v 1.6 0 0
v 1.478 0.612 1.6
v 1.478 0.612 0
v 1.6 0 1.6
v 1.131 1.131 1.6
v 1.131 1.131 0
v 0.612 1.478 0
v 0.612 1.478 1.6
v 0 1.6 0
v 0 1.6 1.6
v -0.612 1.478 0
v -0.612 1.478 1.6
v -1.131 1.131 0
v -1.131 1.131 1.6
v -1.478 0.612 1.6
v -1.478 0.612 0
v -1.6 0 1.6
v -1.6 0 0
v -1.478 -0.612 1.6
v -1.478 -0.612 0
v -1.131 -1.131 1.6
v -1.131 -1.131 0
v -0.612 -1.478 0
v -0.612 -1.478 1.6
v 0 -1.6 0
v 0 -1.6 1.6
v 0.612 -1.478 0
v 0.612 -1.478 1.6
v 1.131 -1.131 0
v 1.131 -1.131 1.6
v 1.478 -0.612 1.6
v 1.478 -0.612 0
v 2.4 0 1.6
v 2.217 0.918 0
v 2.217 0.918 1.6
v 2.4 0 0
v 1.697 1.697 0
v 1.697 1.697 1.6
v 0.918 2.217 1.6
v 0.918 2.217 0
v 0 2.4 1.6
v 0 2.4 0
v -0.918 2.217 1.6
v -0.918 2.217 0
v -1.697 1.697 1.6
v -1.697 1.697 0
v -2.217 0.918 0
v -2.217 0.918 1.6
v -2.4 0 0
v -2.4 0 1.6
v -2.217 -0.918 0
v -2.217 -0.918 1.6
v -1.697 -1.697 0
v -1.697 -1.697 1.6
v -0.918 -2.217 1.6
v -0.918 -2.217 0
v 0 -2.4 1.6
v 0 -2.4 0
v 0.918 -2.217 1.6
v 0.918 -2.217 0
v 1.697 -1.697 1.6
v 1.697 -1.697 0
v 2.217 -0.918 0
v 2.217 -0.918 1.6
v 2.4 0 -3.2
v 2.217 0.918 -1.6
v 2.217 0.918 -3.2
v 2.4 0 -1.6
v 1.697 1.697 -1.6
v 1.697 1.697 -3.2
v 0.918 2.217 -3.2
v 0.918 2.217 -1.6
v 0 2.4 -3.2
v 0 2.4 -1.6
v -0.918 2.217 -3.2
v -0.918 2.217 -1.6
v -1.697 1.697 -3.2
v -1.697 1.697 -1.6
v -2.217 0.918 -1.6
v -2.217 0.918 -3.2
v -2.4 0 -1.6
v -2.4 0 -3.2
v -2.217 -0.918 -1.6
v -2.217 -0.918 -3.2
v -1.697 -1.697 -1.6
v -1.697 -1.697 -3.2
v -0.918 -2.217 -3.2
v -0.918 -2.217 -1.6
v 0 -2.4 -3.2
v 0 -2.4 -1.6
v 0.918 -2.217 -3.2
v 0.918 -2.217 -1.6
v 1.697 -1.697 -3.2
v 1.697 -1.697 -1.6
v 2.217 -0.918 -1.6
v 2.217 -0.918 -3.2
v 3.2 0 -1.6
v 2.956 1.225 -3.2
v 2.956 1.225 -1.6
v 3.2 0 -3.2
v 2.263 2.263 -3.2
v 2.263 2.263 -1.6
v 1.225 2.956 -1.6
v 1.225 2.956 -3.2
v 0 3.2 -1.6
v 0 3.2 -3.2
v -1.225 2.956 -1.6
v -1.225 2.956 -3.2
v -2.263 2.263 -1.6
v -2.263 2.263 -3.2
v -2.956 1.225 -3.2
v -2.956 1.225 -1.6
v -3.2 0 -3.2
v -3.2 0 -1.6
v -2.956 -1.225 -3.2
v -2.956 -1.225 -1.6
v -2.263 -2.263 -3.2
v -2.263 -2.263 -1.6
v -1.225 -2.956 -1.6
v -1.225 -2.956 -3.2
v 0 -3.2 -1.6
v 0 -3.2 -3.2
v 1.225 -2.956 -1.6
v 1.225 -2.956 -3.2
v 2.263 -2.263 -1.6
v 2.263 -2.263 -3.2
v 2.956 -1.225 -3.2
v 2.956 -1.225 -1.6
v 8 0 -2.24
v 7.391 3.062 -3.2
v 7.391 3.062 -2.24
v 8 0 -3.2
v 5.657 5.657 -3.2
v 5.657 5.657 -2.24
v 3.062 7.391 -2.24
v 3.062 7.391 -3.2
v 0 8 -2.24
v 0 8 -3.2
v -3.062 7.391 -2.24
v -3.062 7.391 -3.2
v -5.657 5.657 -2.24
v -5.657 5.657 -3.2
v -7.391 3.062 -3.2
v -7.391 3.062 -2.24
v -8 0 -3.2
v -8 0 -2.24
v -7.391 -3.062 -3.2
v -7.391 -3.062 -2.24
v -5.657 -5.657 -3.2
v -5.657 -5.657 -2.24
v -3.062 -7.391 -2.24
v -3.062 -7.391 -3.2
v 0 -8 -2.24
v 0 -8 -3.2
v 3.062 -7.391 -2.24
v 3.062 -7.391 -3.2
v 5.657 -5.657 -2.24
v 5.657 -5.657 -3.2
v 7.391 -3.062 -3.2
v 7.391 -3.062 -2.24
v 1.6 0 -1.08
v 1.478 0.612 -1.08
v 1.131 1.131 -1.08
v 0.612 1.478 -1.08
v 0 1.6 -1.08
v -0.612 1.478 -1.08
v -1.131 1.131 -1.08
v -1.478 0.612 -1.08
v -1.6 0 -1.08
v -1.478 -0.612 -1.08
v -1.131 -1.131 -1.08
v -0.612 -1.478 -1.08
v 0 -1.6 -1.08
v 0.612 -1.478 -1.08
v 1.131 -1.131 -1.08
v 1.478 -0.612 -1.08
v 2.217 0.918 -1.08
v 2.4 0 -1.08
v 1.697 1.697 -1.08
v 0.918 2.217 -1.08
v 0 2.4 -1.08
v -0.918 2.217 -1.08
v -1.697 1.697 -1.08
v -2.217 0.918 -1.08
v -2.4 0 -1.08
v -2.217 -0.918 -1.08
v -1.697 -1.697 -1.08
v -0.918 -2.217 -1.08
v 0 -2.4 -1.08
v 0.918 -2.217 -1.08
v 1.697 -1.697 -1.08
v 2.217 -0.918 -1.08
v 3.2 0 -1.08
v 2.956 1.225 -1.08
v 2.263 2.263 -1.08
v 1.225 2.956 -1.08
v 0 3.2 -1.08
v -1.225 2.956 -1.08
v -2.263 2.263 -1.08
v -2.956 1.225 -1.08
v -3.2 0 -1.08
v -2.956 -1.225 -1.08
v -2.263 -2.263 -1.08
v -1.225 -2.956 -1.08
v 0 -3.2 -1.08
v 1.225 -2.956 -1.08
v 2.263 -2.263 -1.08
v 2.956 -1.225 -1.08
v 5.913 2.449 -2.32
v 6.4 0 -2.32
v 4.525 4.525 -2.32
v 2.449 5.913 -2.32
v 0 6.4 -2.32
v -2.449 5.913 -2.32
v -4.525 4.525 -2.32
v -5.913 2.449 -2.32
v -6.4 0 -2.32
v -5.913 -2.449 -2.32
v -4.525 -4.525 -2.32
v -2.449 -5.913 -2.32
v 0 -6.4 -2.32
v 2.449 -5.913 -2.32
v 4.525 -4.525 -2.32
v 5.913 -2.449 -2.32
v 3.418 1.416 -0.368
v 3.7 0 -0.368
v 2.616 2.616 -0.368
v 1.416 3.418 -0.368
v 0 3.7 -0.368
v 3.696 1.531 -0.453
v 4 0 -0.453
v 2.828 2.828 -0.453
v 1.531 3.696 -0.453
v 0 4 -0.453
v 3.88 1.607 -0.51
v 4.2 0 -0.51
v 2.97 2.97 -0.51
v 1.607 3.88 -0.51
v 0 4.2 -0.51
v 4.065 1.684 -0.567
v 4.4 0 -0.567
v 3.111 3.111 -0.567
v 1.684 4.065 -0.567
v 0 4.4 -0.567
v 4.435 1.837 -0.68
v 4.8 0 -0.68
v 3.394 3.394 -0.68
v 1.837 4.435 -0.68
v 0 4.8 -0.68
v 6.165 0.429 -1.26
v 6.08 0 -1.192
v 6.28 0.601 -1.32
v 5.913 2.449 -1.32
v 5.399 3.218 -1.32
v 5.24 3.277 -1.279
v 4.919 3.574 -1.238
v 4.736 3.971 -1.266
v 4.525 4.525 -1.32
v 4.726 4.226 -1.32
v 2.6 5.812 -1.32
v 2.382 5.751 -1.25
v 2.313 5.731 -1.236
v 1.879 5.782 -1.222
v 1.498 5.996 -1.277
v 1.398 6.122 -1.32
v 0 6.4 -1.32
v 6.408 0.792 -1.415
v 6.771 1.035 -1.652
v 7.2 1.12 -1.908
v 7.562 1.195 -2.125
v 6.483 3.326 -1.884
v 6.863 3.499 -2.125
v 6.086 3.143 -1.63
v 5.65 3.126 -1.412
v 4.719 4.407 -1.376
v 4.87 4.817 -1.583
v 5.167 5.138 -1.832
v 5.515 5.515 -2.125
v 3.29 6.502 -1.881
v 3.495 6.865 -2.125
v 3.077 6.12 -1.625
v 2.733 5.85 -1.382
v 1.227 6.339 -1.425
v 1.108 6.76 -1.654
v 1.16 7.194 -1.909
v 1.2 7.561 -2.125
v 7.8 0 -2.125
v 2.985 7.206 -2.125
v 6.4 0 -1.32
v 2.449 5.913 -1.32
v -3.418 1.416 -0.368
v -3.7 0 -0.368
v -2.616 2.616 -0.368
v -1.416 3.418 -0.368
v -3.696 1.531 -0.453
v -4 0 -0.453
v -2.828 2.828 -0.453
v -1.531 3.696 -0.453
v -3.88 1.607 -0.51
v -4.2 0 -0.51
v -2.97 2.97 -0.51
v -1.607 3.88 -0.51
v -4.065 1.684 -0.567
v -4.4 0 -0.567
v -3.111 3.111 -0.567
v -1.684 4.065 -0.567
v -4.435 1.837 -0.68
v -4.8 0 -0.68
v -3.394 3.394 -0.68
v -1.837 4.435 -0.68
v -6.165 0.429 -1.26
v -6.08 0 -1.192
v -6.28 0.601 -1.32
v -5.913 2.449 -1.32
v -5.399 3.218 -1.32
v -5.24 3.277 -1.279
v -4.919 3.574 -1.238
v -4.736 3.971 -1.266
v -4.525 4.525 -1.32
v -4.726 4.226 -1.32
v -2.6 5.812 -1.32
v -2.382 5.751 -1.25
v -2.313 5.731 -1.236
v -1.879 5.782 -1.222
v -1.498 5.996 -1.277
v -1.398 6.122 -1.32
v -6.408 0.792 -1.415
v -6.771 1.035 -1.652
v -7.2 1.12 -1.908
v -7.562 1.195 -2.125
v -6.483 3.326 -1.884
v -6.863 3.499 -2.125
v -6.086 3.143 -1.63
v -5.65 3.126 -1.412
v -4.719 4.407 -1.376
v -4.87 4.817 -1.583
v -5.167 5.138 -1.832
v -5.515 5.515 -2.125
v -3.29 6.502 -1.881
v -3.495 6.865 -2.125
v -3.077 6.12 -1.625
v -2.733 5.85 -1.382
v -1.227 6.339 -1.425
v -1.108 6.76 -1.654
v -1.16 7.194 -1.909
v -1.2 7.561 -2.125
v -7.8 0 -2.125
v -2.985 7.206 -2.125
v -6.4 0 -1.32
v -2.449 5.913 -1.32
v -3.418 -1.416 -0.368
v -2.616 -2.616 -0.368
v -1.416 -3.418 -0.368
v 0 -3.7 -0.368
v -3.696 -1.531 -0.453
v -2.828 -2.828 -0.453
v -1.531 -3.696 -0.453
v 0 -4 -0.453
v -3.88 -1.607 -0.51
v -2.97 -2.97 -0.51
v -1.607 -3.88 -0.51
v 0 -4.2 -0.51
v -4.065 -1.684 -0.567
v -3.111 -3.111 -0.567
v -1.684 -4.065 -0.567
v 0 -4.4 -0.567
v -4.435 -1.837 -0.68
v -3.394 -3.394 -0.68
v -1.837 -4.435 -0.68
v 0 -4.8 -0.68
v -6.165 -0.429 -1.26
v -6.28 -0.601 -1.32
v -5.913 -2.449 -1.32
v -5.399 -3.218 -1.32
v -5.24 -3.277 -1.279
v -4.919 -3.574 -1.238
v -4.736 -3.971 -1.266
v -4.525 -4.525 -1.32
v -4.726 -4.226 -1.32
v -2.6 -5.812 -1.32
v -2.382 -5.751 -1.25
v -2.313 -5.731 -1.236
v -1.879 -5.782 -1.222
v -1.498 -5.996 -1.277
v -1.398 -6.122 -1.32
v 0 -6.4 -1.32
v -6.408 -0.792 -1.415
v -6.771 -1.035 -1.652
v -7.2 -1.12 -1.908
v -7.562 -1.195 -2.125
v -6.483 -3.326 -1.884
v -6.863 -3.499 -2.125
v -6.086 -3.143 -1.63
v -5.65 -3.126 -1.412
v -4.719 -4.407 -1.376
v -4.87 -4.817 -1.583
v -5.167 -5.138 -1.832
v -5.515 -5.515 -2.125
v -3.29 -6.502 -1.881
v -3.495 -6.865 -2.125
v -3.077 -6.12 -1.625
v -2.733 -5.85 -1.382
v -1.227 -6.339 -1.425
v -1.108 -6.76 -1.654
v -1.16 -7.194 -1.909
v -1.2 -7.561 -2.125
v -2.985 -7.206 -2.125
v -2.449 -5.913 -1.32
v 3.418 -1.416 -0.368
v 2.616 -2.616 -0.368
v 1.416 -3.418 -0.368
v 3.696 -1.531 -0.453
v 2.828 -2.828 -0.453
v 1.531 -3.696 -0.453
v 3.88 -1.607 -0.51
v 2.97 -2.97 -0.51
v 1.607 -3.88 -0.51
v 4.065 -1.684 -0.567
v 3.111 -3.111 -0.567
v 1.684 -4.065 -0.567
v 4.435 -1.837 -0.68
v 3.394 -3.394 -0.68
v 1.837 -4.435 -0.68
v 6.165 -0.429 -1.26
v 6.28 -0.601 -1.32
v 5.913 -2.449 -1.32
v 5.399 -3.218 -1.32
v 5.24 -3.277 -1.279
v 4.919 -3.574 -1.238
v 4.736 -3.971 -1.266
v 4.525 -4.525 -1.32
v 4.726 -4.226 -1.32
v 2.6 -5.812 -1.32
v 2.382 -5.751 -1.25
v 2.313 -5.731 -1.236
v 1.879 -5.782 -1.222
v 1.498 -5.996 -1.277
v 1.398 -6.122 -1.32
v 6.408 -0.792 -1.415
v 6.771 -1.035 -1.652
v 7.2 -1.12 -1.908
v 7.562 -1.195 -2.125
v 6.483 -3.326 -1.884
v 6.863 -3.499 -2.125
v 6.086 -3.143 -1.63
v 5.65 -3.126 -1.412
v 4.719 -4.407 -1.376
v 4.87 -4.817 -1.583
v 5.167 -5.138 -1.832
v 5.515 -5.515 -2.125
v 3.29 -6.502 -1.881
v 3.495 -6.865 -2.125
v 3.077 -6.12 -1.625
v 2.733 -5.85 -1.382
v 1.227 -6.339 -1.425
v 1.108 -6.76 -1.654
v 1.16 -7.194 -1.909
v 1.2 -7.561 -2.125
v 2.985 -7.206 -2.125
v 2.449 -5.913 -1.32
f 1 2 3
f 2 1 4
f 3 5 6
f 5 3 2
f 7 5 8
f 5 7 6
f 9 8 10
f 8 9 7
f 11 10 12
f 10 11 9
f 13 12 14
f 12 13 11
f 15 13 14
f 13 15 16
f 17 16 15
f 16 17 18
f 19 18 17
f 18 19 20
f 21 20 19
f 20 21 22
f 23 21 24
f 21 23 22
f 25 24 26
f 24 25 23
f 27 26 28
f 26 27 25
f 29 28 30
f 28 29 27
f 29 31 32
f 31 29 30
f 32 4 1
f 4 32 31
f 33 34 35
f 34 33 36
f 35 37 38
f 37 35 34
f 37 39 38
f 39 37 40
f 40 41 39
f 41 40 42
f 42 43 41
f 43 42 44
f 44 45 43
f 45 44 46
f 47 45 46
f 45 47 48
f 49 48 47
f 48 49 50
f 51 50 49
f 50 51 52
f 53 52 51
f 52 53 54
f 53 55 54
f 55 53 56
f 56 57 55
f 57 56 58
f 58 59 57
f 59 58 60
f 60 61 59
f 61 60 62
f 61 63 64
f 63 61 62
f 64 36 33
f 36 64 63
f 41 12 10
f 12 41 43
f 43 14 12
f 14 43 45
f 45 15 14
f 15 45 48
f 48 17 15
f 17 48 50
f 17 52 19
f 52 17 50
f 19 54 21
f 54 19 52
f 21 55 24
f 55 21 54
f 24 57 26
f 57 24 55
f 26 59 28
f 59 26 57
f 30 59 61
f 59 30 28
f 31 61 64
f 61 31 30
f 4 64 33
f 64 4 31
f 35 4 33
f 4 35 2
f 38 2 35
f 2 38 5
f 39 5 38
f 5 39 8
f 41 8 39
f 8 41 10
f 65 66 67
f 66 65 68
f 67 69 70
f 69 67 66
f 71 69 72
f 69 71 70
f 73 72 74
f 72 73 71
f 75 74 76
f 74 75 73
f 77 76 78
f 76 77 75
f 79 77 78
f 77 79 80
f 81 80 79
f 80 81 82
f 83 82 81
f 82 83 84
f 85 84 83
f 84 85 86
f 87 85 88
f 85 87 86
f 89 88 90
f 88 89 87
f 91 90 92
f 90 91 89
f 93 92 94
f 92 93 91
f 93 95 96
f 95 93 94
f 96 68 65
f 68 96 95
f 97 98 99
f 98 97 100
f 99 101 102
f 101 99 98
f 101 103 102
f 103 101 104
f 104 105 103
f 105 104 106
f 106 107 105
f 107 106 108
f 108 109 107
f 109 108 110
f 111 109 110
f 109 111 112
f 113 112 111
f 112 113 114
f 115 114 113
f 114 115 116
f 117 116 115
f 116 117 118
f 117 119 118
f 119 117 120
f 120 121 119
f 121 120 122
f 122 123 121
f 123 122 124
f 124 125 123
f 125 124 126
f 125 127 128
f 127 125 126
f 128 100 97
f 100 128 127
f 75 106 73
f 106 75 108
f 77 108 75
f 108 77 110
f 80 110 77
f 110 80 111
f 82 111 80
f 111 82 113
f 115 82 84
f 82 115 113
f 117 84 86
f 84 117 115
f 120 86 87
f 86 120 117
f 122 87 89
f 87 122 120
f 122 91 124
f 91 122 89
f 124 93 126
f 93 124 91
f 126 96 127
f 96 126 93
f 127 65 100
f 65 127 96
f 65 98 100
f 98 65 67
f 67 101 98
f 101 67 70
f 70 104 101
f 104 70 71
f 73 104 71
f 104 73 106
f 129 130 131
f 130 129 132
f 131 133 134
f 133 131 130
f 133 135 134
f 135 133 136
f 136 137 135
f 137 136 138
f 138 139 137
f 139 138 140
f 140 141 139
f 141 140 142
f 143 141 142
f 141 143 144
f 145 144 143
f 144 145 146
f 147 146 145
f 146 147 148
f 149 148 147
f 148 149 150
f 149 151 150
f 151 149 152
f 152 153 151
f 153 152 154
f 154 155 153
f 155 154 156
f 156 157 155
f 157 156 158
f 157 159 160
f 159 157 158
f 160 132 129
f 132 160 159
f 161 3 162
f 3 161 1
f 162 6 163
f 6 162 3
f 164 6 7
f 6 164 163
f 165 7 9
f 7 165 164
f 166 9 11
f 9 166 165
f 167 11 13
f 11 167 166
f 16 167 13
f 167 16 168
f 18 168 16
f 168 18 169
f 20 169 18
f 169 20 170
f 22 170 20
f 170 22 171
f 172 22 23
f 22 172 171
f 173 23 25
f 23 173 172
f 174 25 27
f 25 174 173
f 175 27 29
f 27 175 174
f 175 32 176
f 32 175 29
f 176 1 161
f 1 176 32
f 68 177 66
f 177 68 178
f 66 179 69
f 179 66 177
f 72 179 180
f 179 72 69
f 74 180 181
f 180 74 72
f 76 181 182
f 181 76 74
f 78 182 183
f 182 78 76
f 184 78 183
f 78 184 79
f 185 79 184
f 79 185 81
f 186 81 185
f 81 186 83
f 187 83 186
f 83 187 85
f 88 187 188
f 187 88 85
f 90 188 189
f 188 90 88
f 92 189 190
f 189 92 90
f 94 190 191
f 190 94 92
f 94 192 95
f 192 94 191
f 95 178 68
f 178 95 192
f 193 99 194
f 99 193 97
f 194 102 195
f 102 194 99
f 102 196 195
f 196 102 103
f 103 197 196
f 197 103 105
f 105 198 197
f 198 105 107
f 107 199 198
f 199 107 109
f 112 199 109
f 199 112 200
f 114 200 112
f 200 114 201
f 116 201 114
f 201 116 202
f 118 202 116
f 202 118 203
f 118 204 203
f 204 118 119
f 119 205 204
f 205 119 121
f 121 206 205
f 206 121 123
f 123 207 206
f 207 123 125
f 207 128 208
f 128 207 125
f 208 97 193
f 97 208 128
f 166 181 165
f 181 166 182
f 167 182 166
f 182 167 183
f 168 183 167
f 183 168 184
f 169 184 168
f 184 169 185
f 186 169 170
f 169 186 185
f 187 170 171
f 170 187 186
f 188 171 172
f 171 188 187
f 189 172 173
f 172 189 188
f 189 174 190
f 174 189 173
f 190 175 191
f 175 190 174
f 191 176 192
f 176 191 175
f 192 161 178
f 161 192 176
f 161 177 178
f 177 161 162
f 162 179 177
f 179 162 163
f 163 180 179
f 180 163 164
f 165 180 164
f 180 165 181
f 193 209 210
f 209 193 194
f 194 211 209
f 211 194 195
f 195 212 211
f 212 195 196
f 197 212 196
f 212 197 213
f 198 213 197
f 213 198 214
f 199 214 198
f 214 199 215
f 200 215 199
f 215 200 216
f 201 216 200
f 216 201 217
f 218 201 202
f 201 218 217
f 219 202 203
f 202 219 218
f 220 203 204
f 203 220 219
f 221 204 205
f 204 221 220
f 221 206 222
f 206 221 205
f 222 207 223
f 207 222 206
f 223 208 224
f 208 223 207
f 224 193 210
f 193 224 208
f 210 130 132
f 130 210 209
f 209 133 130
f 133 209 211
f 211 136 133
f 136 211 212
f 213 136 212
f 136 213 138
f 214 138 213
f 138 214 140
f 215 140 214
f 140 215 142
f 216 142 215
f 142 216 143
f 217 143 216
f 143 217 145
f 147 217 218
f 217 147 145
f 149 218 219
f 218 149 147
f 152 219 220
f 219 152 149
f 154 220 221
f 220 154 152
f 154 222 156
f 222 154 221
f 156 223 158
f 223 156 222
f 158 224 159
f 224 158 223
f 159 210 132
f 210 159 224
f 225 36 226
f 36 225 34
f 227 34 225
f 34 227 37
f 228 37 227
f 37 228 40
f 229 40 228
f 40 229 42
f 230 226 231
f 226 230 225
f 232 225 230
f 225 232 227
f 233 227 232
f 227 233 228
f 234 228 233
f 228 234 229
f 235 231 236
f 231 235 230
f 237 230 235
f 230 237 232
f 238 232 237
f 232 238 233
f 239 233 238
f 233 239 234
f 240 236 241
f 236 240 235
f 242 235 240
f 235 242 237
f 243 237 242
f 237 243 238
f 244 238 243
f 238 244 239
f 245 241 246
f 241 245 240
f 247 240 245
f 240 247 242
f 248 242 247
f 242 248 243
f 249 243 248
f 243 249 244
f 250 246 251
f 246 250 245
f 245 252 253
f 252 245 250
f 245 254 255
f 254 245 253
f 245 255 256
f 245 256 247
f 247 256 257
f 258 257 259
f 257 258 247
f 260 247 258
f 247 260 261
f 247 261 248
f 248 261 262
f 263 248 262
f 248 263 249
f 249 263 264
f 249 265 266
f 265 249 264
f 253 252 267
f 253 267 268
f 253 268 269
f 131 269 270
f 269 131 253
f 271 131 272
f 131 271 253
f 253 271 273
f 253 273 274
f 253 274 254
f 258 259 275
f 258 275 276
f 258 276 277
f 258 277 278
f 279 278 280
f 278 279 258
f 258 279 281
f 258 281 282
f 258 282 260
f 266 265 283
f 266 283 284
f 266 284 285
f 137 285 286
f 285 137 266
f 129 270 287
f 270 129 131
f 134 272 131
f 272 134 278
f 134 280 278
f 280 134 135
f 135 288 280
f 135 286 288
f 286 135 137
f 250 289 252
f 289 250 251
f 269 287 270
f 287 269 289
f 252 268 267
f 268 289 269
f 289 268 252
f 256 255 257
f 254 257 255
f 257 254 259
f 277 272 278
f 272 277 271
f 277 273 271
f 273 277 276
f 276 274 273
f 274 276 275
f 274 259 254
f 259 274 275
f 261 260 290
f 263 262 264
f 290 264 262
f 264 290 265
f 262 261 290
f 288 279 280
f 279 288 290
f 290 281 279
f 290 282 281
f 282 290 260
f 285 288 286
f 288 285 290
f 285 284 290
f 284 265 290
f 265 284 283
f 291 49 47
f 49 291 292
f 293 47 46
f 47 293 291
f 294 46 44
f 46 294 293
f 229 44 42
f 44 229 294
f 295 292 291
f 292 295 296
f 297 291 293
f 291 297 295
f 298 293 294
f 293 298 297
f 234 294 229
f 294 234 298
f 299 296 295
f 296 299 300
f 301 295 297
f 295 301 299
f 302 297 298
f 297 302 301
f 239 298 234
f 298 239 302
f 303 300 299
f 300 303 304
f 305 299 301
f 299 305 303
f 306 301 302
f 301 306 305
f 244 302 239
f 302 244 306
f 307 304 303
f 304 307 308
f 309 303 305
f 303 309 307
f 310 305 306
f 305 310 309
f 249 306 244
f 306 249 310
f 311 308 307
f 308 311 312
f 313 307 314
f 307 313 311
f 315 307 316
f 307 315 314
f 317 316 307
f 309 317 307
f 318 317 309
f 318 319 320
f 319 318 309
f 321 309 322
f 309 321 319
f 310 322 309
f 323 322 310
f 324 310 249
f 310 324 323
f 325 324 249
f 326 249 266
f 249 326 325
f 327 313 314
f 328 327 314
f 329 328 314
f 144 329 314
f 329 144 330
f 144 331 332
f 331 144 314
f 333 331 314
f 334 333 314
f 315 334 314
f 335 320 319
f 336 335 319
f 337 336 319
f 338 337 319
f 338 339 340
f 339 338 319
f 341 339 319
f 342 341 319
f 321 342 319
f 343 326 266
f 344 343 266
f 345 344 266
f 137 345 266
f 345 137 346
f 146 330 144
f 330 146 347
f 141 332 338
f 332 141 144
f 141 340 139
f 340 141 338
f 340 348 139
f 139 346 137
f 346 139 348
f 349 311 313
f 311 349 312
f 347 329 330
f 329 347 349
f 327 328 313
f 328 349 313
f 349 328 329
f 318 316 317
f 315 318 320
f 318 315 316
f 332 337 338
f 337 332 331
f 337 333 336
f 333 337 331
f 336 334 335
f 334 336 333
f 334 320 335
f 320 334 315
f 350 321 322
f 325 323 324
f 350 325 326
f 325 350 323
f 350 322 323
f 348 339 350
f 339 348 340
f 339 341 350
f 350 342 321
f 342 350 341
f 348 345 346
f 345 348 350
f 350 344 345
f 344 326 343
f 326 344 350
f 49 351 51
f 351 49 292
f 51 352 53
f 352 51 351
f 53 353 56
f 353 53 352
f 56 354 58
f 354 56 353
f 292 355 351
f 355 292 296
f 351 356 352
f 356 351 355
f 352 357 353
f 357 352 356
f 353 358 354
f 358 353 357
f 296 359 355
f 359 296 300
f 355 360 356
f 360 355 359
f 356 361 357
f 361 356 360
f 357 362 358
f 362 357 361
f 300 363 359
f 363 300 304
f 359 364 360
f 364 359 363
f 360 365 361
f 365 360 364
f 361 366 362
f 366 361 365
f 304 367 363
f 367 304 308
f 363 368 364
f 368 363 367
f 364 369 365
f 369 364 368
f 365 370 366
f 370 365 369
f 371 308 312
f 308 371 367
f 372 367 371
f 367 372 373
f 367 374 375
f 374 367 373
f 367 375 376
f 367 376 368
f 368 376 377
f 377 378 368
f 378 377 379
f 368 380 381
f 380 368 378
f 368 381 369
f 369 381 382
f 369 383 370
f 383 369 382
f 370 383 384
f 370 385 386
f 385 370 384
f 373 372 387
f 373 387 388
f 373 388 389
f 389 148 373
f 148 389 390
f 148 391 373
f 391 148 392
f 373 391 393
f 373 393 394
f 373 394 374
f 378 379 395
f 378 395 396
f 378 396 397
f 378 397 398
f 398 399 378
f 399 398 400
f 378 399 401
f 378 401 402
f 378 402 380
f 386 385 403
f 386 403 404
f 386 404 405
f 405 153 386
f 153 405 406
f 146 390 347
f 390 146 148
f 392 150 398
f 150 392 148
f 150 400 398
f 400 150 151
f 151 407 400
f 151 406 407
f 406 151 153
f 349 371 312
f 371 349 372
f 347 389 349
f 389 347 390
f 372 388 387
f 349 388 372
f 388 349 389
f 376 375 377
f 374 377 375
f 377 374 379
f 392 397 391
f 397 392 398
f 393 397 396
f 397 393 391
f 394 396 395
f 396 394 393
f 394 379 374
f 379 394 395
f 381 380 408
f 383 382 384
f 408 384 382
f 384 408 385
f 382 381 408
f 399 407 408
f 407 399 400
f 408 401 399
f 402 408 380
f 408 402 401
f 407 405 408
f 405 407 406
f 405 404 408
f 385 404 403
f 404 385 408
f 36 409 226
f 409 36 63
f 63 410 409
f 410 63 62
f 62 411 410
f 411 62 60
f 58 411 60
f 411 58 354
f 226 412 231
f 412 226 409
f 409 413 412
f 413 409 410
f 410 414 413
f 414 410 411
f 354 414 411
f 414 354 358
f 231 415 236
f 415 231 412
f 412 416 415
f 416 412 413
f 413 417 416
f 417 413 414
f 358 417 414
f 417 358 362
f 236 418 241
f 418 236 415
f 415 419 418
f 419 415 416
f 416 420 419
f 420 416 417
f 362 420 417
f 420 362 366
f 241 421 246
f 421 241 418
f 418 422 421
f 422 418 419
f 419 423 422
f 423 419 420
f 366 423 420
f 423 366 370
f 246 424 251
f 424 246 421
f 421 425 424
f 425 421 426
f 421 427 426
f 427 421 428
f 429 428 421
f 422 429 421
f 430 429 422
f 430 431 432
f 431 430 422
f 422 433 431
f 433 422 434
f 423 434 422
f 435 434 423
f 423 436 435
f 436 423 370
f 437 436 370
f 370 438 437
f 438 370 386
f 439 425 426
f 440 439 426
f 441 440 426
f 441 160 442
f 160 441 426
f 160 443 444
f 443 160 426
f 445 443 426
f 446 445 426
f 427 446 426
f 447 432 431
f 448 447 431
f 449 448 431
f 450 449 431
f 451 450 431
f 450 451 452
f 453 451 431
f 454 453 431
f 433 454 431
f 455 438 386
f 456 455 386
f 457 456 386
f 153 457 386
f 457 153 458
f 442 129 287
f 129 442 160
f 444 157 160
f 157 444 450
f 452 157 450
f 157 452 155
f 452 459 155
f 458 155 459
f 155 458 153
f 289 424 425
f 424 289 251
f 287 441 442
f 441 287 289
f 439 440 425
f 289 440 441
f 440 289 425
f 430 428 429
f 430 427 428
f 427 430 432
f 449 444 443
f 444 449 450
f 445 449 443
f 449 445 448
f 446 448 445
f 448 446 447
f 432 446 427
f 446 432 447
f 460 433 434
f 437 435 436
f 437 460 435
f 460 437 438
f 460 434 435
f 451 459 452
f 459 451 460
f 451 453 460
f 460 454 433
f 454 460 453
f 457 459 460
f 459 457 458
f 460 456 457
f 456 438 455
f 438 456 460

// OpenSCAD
use <../lib.scad>
use <s/4740p05s01.scad>
use <s/4740s01.scad>
function ldraw_lib__4740p05() = [
// 0 Dish  2 x  2 Inverted with 2 Black Rings and 10 Black Holes Pattern
// 0 Name: 4740p05.dat
// 0 Author: Massimo Maso [Sirio]
// 0 !LDRAW_ORG Part UPDATE 2022-04
// 0 !LICENSE Licensed under CC BY 4.0 : see CAreadme.txt
// 
// 0 BFC CERTIFY CCW
  [0,"BFC","CERTIFY"],
  [0,"BFC","CCW"],
// 
// 0 !KEYWORDS Bricklink 4740pb020, Challenger, Dodge, set 76904, Speed Champions
// 0 !KEYWORDS T/A
// 
// 0 !HISTORY 2022-07-18 [PTadmin] Official Update 2022-04
// 
// 
// 1 16 0 0 0 1 0 0 0 1 0 0 0 1 s\4740s01.dat
  [1,16,0,0,0,1,0,0,0,1,0,0,0,1, ldraw_lib__s__4740s01()],
// 1 16 0 0 0 1 0 0 0 1 0 0 0 1 s\4740p05s01.dat
  [1,16,0,0,0,1,0,0,0,1,0,0,0,1, ldraw_lib__s__4740p05s01()],
// 1 16 0 0 0 -1 0 0 0 1 0 0 0 1 s\4740p05s01.dat
  [1,16,0,0,0,-1,0,0,0,1,0,0,0,1, ldraw_lib__s__4740p05s01()],
// 1 16 0 0 0 -1 0 0 0 1 0 0 0 -1 s\4740p05s01.dat
  [1,16,0,0,0,-1,0,0,0,1,0,0,0,-1, ldraw_lib__s__4740p05s01()],
// 1 16 0 0 0 1 0 0 0 1 0 0 0 -1 s\4740p05s01.dat
  [1,16,0,0,0,1,0,0,0,1,0,0,0,-1, ldraw_lib__s__4740p05s01()],
];
module ldraw_lib__4740p05(step=0, col=false, unit=2/5, alt=false, line=0.2, solid=!$preview)
    makepoly(ldraw_lib__4740p05(), step=step, col=col, unit=unit, alt=alt, line=line, solid=solid);
ldraw_lib__4740p05(line=0.2);
